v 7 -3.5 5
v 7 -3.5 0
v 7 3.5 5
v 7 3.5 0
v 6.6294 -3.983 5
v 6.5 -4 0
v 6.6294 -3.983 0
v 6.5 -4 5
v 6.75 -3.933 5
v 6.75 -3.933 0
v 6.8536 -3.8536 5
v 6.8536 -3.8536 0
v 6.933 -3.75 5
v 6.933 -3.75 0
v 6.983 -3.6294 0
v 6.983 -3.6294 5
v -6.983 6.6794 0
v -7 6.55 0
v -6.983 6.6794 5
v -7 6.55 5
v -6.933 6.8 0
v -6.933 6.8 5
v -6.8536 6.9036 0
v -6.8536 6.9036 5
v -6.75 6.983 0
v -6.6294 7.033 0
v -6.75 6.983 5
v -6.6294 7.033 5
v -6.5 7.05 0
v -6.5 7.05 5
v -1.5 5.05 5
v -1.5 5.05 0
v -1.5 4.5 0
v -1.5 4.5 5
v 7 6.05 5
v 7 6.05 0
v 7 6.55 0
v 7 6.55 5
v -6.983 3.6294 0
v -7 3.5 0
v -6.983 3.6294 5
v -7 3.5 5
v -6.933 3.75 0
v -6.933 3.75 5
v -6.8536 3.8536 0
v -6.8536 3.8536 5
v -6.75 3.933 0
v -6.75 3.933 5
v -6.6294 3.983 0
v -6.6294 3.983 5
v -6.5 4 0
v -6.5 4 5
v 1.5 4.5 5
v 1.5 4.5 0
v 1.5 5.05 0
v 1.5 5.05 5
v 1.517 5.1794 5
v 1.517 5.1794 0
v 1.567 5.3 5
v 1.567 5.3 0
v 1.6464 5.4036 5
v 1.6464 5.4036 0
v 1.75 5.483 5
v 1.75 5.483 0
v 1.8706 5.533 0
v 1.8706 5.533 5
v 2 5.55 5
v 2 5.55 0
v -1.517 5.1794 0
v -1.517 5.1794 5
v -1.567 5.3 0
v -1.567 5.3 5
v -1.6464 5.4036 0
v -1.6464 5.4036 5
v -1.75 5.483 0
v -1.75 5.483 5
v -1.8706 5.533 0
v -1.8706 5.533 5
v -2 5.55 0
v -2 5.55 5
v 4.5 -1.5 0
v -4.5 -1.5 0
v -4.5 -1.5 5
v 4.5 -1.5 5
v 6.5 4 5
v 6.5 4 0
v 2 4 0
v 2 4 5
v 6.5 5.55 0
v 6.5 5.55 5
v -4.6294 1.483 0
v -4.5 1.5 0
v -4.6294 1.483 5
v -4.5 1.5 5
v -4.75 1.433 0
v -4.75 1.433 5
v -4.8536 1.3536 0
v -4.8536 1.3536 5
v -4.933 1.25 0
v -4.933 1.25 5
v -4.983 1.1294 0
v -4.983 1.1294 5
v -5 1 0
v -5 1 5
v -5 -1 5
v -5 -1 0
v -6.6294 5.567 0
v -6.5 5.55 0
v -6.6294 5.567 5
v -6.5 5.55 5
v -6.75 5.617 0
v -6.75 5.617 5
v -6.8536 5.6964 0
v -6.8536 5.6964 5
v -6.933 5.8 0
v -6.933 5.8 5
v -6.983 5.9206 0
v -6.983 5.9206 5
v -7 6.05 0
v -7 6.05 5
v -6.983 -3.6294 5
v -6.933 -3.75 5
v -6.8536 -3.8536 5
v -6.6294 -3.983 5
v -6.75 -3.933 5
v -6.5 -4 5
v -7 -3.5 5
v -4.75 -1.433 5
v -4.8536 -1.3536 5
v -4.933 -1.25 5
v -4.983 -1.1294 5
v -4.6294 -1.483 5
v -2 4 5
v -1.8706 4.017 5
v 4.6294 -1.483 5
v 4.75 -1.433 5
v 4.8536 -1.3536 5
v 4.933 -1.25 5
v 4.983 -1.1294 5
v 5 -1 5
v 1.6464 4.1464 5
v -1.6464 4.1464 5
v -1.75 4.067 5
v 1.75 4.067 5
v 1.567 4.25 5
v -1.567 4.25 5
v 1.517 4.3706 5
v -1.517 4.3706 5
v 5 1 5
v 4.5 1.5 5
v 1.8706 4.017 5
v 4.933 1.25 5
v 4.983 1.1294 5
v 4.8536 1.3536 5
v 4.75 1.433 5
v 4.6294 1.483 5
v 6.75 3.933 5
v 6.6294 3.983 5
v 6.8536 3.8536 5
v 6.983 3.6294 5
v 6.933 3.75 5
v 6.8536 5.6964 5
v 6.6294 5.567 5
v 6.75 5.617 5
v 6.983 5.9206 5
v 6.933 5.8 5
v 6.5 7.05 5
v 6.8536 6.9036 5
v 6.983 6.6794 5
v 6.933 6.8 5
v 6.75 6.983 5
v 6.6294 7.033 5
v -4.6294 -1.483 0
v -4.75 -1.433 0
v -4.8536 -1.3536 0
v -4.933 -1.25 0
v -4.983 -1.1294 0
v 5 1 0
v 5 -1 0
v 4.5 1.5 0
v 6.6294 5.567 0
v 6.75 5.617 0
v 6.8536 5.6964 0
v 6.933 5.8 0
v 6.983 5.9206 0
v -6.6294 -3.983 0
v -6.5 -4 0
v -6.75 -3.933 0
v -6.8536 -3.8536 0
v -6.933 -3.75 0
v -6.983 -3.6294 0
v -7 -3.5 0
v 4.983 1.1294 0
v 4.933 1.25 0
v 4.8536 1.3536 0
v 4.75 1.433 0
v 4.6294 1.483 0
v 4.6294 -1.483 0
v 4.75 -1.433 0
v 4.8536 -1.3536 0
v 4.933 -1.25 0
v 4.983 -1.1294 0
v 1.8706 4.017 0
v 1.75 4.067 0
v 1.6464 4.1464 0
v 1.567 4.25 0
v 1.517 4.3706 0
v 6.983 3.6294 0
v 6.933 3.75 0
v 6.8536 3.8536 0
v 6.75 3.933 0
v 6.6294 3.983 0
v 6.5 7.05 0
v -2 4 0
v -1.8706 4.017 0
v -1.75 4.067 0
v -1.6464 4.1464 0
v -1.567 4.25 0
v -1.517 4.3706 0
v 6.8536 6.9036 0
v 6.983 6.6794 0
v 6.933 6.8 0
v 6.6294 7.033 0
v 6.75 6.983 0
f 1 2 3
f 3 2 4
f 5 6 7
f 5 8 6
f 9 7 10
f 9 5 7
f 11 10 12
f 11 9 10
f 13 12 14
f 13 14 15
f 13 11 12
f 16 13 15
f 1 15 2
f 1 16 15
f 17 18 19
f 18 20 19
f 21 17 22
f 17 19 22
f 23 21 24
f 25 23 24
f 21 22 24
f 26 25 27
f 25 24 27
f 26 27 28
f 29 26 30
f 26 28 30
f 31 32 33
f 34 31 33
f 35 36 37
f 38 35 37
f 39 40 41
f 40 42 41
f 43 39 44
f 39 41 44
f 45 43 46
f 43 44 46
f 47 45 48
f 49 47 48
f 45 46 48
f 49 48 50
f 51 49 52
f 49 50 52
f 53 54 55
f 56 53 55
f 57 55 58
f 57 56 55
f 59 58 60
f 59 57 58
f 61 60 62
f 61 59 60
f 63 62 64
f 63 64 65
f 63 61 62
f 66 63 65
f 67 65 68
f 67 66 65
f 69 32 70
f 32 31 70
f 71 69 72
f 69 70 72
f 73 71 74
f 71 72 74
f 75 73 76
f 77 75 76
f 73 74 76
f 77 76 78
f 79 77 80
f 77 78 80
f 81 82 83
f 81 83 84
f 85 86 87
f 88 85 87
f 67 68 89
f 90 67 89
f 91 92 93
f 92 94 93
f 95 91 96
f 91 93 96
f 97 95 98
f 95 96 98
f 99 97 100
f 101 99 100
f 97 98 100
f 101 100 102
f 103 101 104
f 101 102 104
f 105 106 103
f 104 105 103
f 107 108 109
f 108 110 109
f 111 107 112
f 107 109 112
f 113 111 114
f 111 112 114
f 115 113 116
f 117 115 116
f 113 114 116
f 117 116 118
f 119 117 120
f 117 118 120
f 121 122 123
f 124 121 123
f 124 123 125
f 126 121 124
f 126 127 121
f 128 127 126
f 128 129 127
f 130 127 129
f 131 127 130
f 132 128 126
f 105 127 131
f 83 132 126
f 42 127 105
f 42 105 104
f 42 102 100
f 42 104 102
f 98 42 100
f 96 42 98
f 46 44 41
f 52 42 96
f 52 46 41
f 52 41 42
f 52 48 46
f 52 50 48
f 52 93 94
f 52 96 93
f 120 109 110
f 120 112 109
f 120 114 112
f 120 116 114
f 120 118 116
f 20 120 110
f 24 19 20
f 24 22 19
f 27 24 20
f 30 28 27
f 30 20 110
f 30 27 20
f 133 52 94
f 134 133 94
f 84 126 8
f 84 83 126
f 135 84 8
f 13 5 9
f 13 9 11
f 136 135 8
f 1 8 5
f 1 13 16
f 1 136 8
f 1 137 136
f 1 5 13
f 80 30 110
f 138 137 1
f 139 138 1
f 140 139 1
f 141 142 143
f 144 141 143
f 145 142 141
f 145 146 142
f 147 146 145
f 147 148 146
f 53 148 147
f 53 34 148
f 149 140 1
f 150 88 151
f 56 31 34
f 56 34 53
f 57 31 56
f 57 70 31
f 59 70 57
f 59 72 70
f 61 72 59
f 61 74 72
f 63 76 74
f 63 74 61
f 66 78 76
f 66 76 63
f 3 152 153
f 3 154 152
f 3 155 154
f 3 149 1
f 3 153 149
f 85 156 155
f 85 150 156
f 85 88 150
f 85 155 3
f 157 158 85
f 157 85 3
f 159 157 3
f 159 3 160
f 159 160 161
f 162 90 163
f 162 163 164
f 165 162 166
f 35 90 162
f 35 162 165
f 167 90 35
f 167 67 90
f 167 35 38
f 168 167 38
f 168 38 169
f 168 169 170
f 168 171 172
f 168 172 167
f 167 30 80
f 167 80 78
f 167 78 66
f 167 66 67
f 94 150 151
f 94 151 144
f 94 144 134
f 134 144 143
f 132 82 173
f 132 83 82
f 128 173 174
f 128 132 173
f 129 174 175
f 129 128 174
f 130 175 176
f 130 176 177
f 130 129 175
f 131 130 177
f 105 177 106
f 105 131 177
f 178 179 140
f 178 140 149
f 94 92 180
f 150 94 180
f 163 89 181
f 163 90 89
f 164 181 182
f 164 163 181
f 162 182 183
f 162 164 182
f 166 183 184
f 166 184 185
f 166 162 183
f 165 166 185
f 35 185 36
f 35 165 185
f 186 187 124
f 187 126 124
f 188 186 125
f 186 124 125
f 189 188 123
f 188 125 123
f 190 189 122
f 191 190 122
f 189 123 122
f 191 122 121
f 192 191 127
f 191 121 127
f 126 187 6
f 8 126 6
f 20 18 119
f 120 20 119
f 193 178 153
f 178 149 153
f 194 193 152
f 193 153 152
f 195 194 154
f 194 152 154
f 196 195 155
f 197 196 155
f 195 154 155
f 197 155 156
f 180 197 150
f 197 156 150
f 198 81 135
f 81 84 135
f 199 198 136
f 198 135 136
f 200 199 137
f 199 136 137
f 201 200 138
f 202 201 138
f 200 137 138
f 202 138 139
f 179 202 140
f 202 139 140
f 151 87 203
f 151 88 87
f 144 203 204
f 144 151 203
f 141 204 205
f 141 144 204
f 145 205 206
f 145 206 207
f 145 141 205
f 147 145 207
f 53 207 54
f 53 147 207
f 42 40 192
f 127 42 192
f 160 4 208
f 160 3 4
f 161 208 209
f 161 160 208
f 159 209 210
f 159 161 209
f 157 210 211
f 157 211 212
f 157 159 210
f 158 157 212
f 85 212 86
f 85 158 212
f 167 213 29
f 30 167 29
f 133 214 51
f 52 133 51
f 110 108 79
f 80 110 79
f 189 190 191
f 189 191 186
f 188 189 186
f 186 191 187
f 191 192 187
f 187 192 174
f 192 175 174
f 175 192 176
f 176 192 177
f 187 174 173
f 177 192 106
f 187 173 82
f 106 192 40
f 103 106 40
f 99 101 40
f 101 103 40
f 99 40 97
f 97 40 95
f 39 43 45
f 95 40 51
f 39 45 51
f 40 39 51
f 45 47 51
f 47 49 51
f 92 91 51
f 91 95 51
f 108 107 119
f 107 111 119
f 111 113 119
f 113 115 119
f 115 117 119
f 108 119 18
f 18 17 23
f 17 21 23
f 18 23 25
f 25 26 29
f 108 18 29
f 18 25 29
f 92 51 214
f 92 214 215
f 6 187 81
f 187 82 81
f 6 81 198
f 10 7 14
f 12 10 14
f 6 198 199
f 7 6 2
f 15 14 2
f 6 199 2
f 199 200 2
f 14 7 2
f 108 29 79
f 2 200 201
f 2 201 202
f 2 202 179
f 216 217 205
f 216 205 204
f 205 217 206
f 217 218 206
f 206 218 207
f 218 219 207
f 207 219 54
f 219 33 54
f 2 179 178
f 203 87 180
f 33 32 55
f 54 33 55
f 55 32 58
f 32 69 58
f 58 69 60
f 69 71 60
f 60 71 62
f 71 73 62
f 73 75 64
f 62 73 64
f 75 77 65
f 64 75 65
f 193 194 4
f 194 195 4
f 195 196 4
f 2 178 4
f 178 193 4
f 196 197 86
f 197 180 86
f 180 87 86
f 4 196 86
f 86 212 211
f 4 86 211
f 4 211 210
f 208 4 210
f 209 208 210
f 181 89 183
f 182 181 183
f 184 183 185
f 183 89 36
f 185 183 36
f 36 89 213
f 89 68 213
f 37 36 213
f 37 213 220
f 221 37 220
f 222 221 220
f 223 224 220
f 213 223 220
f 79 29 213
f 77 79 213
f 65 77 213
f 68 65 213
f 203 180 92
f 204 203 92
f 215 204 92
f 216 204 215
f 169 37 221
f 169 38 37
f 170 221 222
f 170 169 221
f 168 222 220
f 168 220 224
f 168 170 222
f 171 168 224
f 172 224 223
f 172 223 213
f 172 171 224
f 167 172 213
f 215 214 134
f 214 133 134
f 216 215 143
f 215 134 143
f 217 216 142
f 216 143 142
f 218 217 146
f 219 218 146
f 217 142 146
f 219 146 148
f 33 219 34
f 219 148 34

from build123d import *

# Parameters (mm, degrees)
SKETCH1_W           = 10
SKETCH1_H           = 3
BOSS_EXTRUDE1_DEPTH = 5
FILLET2_R           = 0.5


with BuildPart() as part:
    # Sketch1 → Boss-Extrude1 (new body)
    with BuildSketch(Plane.XY):
        Polygon((-7, -4), (7, -4), (7, 4), (1.5, 4), (1.5, 5.55), (7, 5.55), (7, 7.05), (-7, 7.05), (-7, 5.55), (-1.5, 5.55), (-1.5, 4), (-7, 4), align=None)
        Rectangle(SKETCH1_W, SKETCH1_H, mode=Mode.SUBTRACT)
    extrude(amount=BOSS_EXTRUDE1_DEPTH)

    # Fillet2
    fillet2_edges = [part.edges().sort_by_distance(p)[0] for p in [
        (-7, 4, 2.5),
        (-1.5, 4, 2.5),
        (-1.5, 5.55, 2.5),
        (-7, 5.55, 2.5),
        (-7, 7.05, 2.5),
        (7, 7.05, 2.5),
        (7, 5.55, 2.5),
        (1.5, 5.55, 2.5),
        (1.5, 4, 2.5),
        (7, 4, 2.5),
        (7, -4, 2.5),
        (-7, -4, 2.5),
        (-5, 1.5, 2.5),
        (-5, -1.5, 2.5),
        (5, -1.5, 2.5),
        (5, 1.5, 2.5),
    ]]
    fillet(fillet2_edges, radius=FILLET2_R)


solid = part.part
